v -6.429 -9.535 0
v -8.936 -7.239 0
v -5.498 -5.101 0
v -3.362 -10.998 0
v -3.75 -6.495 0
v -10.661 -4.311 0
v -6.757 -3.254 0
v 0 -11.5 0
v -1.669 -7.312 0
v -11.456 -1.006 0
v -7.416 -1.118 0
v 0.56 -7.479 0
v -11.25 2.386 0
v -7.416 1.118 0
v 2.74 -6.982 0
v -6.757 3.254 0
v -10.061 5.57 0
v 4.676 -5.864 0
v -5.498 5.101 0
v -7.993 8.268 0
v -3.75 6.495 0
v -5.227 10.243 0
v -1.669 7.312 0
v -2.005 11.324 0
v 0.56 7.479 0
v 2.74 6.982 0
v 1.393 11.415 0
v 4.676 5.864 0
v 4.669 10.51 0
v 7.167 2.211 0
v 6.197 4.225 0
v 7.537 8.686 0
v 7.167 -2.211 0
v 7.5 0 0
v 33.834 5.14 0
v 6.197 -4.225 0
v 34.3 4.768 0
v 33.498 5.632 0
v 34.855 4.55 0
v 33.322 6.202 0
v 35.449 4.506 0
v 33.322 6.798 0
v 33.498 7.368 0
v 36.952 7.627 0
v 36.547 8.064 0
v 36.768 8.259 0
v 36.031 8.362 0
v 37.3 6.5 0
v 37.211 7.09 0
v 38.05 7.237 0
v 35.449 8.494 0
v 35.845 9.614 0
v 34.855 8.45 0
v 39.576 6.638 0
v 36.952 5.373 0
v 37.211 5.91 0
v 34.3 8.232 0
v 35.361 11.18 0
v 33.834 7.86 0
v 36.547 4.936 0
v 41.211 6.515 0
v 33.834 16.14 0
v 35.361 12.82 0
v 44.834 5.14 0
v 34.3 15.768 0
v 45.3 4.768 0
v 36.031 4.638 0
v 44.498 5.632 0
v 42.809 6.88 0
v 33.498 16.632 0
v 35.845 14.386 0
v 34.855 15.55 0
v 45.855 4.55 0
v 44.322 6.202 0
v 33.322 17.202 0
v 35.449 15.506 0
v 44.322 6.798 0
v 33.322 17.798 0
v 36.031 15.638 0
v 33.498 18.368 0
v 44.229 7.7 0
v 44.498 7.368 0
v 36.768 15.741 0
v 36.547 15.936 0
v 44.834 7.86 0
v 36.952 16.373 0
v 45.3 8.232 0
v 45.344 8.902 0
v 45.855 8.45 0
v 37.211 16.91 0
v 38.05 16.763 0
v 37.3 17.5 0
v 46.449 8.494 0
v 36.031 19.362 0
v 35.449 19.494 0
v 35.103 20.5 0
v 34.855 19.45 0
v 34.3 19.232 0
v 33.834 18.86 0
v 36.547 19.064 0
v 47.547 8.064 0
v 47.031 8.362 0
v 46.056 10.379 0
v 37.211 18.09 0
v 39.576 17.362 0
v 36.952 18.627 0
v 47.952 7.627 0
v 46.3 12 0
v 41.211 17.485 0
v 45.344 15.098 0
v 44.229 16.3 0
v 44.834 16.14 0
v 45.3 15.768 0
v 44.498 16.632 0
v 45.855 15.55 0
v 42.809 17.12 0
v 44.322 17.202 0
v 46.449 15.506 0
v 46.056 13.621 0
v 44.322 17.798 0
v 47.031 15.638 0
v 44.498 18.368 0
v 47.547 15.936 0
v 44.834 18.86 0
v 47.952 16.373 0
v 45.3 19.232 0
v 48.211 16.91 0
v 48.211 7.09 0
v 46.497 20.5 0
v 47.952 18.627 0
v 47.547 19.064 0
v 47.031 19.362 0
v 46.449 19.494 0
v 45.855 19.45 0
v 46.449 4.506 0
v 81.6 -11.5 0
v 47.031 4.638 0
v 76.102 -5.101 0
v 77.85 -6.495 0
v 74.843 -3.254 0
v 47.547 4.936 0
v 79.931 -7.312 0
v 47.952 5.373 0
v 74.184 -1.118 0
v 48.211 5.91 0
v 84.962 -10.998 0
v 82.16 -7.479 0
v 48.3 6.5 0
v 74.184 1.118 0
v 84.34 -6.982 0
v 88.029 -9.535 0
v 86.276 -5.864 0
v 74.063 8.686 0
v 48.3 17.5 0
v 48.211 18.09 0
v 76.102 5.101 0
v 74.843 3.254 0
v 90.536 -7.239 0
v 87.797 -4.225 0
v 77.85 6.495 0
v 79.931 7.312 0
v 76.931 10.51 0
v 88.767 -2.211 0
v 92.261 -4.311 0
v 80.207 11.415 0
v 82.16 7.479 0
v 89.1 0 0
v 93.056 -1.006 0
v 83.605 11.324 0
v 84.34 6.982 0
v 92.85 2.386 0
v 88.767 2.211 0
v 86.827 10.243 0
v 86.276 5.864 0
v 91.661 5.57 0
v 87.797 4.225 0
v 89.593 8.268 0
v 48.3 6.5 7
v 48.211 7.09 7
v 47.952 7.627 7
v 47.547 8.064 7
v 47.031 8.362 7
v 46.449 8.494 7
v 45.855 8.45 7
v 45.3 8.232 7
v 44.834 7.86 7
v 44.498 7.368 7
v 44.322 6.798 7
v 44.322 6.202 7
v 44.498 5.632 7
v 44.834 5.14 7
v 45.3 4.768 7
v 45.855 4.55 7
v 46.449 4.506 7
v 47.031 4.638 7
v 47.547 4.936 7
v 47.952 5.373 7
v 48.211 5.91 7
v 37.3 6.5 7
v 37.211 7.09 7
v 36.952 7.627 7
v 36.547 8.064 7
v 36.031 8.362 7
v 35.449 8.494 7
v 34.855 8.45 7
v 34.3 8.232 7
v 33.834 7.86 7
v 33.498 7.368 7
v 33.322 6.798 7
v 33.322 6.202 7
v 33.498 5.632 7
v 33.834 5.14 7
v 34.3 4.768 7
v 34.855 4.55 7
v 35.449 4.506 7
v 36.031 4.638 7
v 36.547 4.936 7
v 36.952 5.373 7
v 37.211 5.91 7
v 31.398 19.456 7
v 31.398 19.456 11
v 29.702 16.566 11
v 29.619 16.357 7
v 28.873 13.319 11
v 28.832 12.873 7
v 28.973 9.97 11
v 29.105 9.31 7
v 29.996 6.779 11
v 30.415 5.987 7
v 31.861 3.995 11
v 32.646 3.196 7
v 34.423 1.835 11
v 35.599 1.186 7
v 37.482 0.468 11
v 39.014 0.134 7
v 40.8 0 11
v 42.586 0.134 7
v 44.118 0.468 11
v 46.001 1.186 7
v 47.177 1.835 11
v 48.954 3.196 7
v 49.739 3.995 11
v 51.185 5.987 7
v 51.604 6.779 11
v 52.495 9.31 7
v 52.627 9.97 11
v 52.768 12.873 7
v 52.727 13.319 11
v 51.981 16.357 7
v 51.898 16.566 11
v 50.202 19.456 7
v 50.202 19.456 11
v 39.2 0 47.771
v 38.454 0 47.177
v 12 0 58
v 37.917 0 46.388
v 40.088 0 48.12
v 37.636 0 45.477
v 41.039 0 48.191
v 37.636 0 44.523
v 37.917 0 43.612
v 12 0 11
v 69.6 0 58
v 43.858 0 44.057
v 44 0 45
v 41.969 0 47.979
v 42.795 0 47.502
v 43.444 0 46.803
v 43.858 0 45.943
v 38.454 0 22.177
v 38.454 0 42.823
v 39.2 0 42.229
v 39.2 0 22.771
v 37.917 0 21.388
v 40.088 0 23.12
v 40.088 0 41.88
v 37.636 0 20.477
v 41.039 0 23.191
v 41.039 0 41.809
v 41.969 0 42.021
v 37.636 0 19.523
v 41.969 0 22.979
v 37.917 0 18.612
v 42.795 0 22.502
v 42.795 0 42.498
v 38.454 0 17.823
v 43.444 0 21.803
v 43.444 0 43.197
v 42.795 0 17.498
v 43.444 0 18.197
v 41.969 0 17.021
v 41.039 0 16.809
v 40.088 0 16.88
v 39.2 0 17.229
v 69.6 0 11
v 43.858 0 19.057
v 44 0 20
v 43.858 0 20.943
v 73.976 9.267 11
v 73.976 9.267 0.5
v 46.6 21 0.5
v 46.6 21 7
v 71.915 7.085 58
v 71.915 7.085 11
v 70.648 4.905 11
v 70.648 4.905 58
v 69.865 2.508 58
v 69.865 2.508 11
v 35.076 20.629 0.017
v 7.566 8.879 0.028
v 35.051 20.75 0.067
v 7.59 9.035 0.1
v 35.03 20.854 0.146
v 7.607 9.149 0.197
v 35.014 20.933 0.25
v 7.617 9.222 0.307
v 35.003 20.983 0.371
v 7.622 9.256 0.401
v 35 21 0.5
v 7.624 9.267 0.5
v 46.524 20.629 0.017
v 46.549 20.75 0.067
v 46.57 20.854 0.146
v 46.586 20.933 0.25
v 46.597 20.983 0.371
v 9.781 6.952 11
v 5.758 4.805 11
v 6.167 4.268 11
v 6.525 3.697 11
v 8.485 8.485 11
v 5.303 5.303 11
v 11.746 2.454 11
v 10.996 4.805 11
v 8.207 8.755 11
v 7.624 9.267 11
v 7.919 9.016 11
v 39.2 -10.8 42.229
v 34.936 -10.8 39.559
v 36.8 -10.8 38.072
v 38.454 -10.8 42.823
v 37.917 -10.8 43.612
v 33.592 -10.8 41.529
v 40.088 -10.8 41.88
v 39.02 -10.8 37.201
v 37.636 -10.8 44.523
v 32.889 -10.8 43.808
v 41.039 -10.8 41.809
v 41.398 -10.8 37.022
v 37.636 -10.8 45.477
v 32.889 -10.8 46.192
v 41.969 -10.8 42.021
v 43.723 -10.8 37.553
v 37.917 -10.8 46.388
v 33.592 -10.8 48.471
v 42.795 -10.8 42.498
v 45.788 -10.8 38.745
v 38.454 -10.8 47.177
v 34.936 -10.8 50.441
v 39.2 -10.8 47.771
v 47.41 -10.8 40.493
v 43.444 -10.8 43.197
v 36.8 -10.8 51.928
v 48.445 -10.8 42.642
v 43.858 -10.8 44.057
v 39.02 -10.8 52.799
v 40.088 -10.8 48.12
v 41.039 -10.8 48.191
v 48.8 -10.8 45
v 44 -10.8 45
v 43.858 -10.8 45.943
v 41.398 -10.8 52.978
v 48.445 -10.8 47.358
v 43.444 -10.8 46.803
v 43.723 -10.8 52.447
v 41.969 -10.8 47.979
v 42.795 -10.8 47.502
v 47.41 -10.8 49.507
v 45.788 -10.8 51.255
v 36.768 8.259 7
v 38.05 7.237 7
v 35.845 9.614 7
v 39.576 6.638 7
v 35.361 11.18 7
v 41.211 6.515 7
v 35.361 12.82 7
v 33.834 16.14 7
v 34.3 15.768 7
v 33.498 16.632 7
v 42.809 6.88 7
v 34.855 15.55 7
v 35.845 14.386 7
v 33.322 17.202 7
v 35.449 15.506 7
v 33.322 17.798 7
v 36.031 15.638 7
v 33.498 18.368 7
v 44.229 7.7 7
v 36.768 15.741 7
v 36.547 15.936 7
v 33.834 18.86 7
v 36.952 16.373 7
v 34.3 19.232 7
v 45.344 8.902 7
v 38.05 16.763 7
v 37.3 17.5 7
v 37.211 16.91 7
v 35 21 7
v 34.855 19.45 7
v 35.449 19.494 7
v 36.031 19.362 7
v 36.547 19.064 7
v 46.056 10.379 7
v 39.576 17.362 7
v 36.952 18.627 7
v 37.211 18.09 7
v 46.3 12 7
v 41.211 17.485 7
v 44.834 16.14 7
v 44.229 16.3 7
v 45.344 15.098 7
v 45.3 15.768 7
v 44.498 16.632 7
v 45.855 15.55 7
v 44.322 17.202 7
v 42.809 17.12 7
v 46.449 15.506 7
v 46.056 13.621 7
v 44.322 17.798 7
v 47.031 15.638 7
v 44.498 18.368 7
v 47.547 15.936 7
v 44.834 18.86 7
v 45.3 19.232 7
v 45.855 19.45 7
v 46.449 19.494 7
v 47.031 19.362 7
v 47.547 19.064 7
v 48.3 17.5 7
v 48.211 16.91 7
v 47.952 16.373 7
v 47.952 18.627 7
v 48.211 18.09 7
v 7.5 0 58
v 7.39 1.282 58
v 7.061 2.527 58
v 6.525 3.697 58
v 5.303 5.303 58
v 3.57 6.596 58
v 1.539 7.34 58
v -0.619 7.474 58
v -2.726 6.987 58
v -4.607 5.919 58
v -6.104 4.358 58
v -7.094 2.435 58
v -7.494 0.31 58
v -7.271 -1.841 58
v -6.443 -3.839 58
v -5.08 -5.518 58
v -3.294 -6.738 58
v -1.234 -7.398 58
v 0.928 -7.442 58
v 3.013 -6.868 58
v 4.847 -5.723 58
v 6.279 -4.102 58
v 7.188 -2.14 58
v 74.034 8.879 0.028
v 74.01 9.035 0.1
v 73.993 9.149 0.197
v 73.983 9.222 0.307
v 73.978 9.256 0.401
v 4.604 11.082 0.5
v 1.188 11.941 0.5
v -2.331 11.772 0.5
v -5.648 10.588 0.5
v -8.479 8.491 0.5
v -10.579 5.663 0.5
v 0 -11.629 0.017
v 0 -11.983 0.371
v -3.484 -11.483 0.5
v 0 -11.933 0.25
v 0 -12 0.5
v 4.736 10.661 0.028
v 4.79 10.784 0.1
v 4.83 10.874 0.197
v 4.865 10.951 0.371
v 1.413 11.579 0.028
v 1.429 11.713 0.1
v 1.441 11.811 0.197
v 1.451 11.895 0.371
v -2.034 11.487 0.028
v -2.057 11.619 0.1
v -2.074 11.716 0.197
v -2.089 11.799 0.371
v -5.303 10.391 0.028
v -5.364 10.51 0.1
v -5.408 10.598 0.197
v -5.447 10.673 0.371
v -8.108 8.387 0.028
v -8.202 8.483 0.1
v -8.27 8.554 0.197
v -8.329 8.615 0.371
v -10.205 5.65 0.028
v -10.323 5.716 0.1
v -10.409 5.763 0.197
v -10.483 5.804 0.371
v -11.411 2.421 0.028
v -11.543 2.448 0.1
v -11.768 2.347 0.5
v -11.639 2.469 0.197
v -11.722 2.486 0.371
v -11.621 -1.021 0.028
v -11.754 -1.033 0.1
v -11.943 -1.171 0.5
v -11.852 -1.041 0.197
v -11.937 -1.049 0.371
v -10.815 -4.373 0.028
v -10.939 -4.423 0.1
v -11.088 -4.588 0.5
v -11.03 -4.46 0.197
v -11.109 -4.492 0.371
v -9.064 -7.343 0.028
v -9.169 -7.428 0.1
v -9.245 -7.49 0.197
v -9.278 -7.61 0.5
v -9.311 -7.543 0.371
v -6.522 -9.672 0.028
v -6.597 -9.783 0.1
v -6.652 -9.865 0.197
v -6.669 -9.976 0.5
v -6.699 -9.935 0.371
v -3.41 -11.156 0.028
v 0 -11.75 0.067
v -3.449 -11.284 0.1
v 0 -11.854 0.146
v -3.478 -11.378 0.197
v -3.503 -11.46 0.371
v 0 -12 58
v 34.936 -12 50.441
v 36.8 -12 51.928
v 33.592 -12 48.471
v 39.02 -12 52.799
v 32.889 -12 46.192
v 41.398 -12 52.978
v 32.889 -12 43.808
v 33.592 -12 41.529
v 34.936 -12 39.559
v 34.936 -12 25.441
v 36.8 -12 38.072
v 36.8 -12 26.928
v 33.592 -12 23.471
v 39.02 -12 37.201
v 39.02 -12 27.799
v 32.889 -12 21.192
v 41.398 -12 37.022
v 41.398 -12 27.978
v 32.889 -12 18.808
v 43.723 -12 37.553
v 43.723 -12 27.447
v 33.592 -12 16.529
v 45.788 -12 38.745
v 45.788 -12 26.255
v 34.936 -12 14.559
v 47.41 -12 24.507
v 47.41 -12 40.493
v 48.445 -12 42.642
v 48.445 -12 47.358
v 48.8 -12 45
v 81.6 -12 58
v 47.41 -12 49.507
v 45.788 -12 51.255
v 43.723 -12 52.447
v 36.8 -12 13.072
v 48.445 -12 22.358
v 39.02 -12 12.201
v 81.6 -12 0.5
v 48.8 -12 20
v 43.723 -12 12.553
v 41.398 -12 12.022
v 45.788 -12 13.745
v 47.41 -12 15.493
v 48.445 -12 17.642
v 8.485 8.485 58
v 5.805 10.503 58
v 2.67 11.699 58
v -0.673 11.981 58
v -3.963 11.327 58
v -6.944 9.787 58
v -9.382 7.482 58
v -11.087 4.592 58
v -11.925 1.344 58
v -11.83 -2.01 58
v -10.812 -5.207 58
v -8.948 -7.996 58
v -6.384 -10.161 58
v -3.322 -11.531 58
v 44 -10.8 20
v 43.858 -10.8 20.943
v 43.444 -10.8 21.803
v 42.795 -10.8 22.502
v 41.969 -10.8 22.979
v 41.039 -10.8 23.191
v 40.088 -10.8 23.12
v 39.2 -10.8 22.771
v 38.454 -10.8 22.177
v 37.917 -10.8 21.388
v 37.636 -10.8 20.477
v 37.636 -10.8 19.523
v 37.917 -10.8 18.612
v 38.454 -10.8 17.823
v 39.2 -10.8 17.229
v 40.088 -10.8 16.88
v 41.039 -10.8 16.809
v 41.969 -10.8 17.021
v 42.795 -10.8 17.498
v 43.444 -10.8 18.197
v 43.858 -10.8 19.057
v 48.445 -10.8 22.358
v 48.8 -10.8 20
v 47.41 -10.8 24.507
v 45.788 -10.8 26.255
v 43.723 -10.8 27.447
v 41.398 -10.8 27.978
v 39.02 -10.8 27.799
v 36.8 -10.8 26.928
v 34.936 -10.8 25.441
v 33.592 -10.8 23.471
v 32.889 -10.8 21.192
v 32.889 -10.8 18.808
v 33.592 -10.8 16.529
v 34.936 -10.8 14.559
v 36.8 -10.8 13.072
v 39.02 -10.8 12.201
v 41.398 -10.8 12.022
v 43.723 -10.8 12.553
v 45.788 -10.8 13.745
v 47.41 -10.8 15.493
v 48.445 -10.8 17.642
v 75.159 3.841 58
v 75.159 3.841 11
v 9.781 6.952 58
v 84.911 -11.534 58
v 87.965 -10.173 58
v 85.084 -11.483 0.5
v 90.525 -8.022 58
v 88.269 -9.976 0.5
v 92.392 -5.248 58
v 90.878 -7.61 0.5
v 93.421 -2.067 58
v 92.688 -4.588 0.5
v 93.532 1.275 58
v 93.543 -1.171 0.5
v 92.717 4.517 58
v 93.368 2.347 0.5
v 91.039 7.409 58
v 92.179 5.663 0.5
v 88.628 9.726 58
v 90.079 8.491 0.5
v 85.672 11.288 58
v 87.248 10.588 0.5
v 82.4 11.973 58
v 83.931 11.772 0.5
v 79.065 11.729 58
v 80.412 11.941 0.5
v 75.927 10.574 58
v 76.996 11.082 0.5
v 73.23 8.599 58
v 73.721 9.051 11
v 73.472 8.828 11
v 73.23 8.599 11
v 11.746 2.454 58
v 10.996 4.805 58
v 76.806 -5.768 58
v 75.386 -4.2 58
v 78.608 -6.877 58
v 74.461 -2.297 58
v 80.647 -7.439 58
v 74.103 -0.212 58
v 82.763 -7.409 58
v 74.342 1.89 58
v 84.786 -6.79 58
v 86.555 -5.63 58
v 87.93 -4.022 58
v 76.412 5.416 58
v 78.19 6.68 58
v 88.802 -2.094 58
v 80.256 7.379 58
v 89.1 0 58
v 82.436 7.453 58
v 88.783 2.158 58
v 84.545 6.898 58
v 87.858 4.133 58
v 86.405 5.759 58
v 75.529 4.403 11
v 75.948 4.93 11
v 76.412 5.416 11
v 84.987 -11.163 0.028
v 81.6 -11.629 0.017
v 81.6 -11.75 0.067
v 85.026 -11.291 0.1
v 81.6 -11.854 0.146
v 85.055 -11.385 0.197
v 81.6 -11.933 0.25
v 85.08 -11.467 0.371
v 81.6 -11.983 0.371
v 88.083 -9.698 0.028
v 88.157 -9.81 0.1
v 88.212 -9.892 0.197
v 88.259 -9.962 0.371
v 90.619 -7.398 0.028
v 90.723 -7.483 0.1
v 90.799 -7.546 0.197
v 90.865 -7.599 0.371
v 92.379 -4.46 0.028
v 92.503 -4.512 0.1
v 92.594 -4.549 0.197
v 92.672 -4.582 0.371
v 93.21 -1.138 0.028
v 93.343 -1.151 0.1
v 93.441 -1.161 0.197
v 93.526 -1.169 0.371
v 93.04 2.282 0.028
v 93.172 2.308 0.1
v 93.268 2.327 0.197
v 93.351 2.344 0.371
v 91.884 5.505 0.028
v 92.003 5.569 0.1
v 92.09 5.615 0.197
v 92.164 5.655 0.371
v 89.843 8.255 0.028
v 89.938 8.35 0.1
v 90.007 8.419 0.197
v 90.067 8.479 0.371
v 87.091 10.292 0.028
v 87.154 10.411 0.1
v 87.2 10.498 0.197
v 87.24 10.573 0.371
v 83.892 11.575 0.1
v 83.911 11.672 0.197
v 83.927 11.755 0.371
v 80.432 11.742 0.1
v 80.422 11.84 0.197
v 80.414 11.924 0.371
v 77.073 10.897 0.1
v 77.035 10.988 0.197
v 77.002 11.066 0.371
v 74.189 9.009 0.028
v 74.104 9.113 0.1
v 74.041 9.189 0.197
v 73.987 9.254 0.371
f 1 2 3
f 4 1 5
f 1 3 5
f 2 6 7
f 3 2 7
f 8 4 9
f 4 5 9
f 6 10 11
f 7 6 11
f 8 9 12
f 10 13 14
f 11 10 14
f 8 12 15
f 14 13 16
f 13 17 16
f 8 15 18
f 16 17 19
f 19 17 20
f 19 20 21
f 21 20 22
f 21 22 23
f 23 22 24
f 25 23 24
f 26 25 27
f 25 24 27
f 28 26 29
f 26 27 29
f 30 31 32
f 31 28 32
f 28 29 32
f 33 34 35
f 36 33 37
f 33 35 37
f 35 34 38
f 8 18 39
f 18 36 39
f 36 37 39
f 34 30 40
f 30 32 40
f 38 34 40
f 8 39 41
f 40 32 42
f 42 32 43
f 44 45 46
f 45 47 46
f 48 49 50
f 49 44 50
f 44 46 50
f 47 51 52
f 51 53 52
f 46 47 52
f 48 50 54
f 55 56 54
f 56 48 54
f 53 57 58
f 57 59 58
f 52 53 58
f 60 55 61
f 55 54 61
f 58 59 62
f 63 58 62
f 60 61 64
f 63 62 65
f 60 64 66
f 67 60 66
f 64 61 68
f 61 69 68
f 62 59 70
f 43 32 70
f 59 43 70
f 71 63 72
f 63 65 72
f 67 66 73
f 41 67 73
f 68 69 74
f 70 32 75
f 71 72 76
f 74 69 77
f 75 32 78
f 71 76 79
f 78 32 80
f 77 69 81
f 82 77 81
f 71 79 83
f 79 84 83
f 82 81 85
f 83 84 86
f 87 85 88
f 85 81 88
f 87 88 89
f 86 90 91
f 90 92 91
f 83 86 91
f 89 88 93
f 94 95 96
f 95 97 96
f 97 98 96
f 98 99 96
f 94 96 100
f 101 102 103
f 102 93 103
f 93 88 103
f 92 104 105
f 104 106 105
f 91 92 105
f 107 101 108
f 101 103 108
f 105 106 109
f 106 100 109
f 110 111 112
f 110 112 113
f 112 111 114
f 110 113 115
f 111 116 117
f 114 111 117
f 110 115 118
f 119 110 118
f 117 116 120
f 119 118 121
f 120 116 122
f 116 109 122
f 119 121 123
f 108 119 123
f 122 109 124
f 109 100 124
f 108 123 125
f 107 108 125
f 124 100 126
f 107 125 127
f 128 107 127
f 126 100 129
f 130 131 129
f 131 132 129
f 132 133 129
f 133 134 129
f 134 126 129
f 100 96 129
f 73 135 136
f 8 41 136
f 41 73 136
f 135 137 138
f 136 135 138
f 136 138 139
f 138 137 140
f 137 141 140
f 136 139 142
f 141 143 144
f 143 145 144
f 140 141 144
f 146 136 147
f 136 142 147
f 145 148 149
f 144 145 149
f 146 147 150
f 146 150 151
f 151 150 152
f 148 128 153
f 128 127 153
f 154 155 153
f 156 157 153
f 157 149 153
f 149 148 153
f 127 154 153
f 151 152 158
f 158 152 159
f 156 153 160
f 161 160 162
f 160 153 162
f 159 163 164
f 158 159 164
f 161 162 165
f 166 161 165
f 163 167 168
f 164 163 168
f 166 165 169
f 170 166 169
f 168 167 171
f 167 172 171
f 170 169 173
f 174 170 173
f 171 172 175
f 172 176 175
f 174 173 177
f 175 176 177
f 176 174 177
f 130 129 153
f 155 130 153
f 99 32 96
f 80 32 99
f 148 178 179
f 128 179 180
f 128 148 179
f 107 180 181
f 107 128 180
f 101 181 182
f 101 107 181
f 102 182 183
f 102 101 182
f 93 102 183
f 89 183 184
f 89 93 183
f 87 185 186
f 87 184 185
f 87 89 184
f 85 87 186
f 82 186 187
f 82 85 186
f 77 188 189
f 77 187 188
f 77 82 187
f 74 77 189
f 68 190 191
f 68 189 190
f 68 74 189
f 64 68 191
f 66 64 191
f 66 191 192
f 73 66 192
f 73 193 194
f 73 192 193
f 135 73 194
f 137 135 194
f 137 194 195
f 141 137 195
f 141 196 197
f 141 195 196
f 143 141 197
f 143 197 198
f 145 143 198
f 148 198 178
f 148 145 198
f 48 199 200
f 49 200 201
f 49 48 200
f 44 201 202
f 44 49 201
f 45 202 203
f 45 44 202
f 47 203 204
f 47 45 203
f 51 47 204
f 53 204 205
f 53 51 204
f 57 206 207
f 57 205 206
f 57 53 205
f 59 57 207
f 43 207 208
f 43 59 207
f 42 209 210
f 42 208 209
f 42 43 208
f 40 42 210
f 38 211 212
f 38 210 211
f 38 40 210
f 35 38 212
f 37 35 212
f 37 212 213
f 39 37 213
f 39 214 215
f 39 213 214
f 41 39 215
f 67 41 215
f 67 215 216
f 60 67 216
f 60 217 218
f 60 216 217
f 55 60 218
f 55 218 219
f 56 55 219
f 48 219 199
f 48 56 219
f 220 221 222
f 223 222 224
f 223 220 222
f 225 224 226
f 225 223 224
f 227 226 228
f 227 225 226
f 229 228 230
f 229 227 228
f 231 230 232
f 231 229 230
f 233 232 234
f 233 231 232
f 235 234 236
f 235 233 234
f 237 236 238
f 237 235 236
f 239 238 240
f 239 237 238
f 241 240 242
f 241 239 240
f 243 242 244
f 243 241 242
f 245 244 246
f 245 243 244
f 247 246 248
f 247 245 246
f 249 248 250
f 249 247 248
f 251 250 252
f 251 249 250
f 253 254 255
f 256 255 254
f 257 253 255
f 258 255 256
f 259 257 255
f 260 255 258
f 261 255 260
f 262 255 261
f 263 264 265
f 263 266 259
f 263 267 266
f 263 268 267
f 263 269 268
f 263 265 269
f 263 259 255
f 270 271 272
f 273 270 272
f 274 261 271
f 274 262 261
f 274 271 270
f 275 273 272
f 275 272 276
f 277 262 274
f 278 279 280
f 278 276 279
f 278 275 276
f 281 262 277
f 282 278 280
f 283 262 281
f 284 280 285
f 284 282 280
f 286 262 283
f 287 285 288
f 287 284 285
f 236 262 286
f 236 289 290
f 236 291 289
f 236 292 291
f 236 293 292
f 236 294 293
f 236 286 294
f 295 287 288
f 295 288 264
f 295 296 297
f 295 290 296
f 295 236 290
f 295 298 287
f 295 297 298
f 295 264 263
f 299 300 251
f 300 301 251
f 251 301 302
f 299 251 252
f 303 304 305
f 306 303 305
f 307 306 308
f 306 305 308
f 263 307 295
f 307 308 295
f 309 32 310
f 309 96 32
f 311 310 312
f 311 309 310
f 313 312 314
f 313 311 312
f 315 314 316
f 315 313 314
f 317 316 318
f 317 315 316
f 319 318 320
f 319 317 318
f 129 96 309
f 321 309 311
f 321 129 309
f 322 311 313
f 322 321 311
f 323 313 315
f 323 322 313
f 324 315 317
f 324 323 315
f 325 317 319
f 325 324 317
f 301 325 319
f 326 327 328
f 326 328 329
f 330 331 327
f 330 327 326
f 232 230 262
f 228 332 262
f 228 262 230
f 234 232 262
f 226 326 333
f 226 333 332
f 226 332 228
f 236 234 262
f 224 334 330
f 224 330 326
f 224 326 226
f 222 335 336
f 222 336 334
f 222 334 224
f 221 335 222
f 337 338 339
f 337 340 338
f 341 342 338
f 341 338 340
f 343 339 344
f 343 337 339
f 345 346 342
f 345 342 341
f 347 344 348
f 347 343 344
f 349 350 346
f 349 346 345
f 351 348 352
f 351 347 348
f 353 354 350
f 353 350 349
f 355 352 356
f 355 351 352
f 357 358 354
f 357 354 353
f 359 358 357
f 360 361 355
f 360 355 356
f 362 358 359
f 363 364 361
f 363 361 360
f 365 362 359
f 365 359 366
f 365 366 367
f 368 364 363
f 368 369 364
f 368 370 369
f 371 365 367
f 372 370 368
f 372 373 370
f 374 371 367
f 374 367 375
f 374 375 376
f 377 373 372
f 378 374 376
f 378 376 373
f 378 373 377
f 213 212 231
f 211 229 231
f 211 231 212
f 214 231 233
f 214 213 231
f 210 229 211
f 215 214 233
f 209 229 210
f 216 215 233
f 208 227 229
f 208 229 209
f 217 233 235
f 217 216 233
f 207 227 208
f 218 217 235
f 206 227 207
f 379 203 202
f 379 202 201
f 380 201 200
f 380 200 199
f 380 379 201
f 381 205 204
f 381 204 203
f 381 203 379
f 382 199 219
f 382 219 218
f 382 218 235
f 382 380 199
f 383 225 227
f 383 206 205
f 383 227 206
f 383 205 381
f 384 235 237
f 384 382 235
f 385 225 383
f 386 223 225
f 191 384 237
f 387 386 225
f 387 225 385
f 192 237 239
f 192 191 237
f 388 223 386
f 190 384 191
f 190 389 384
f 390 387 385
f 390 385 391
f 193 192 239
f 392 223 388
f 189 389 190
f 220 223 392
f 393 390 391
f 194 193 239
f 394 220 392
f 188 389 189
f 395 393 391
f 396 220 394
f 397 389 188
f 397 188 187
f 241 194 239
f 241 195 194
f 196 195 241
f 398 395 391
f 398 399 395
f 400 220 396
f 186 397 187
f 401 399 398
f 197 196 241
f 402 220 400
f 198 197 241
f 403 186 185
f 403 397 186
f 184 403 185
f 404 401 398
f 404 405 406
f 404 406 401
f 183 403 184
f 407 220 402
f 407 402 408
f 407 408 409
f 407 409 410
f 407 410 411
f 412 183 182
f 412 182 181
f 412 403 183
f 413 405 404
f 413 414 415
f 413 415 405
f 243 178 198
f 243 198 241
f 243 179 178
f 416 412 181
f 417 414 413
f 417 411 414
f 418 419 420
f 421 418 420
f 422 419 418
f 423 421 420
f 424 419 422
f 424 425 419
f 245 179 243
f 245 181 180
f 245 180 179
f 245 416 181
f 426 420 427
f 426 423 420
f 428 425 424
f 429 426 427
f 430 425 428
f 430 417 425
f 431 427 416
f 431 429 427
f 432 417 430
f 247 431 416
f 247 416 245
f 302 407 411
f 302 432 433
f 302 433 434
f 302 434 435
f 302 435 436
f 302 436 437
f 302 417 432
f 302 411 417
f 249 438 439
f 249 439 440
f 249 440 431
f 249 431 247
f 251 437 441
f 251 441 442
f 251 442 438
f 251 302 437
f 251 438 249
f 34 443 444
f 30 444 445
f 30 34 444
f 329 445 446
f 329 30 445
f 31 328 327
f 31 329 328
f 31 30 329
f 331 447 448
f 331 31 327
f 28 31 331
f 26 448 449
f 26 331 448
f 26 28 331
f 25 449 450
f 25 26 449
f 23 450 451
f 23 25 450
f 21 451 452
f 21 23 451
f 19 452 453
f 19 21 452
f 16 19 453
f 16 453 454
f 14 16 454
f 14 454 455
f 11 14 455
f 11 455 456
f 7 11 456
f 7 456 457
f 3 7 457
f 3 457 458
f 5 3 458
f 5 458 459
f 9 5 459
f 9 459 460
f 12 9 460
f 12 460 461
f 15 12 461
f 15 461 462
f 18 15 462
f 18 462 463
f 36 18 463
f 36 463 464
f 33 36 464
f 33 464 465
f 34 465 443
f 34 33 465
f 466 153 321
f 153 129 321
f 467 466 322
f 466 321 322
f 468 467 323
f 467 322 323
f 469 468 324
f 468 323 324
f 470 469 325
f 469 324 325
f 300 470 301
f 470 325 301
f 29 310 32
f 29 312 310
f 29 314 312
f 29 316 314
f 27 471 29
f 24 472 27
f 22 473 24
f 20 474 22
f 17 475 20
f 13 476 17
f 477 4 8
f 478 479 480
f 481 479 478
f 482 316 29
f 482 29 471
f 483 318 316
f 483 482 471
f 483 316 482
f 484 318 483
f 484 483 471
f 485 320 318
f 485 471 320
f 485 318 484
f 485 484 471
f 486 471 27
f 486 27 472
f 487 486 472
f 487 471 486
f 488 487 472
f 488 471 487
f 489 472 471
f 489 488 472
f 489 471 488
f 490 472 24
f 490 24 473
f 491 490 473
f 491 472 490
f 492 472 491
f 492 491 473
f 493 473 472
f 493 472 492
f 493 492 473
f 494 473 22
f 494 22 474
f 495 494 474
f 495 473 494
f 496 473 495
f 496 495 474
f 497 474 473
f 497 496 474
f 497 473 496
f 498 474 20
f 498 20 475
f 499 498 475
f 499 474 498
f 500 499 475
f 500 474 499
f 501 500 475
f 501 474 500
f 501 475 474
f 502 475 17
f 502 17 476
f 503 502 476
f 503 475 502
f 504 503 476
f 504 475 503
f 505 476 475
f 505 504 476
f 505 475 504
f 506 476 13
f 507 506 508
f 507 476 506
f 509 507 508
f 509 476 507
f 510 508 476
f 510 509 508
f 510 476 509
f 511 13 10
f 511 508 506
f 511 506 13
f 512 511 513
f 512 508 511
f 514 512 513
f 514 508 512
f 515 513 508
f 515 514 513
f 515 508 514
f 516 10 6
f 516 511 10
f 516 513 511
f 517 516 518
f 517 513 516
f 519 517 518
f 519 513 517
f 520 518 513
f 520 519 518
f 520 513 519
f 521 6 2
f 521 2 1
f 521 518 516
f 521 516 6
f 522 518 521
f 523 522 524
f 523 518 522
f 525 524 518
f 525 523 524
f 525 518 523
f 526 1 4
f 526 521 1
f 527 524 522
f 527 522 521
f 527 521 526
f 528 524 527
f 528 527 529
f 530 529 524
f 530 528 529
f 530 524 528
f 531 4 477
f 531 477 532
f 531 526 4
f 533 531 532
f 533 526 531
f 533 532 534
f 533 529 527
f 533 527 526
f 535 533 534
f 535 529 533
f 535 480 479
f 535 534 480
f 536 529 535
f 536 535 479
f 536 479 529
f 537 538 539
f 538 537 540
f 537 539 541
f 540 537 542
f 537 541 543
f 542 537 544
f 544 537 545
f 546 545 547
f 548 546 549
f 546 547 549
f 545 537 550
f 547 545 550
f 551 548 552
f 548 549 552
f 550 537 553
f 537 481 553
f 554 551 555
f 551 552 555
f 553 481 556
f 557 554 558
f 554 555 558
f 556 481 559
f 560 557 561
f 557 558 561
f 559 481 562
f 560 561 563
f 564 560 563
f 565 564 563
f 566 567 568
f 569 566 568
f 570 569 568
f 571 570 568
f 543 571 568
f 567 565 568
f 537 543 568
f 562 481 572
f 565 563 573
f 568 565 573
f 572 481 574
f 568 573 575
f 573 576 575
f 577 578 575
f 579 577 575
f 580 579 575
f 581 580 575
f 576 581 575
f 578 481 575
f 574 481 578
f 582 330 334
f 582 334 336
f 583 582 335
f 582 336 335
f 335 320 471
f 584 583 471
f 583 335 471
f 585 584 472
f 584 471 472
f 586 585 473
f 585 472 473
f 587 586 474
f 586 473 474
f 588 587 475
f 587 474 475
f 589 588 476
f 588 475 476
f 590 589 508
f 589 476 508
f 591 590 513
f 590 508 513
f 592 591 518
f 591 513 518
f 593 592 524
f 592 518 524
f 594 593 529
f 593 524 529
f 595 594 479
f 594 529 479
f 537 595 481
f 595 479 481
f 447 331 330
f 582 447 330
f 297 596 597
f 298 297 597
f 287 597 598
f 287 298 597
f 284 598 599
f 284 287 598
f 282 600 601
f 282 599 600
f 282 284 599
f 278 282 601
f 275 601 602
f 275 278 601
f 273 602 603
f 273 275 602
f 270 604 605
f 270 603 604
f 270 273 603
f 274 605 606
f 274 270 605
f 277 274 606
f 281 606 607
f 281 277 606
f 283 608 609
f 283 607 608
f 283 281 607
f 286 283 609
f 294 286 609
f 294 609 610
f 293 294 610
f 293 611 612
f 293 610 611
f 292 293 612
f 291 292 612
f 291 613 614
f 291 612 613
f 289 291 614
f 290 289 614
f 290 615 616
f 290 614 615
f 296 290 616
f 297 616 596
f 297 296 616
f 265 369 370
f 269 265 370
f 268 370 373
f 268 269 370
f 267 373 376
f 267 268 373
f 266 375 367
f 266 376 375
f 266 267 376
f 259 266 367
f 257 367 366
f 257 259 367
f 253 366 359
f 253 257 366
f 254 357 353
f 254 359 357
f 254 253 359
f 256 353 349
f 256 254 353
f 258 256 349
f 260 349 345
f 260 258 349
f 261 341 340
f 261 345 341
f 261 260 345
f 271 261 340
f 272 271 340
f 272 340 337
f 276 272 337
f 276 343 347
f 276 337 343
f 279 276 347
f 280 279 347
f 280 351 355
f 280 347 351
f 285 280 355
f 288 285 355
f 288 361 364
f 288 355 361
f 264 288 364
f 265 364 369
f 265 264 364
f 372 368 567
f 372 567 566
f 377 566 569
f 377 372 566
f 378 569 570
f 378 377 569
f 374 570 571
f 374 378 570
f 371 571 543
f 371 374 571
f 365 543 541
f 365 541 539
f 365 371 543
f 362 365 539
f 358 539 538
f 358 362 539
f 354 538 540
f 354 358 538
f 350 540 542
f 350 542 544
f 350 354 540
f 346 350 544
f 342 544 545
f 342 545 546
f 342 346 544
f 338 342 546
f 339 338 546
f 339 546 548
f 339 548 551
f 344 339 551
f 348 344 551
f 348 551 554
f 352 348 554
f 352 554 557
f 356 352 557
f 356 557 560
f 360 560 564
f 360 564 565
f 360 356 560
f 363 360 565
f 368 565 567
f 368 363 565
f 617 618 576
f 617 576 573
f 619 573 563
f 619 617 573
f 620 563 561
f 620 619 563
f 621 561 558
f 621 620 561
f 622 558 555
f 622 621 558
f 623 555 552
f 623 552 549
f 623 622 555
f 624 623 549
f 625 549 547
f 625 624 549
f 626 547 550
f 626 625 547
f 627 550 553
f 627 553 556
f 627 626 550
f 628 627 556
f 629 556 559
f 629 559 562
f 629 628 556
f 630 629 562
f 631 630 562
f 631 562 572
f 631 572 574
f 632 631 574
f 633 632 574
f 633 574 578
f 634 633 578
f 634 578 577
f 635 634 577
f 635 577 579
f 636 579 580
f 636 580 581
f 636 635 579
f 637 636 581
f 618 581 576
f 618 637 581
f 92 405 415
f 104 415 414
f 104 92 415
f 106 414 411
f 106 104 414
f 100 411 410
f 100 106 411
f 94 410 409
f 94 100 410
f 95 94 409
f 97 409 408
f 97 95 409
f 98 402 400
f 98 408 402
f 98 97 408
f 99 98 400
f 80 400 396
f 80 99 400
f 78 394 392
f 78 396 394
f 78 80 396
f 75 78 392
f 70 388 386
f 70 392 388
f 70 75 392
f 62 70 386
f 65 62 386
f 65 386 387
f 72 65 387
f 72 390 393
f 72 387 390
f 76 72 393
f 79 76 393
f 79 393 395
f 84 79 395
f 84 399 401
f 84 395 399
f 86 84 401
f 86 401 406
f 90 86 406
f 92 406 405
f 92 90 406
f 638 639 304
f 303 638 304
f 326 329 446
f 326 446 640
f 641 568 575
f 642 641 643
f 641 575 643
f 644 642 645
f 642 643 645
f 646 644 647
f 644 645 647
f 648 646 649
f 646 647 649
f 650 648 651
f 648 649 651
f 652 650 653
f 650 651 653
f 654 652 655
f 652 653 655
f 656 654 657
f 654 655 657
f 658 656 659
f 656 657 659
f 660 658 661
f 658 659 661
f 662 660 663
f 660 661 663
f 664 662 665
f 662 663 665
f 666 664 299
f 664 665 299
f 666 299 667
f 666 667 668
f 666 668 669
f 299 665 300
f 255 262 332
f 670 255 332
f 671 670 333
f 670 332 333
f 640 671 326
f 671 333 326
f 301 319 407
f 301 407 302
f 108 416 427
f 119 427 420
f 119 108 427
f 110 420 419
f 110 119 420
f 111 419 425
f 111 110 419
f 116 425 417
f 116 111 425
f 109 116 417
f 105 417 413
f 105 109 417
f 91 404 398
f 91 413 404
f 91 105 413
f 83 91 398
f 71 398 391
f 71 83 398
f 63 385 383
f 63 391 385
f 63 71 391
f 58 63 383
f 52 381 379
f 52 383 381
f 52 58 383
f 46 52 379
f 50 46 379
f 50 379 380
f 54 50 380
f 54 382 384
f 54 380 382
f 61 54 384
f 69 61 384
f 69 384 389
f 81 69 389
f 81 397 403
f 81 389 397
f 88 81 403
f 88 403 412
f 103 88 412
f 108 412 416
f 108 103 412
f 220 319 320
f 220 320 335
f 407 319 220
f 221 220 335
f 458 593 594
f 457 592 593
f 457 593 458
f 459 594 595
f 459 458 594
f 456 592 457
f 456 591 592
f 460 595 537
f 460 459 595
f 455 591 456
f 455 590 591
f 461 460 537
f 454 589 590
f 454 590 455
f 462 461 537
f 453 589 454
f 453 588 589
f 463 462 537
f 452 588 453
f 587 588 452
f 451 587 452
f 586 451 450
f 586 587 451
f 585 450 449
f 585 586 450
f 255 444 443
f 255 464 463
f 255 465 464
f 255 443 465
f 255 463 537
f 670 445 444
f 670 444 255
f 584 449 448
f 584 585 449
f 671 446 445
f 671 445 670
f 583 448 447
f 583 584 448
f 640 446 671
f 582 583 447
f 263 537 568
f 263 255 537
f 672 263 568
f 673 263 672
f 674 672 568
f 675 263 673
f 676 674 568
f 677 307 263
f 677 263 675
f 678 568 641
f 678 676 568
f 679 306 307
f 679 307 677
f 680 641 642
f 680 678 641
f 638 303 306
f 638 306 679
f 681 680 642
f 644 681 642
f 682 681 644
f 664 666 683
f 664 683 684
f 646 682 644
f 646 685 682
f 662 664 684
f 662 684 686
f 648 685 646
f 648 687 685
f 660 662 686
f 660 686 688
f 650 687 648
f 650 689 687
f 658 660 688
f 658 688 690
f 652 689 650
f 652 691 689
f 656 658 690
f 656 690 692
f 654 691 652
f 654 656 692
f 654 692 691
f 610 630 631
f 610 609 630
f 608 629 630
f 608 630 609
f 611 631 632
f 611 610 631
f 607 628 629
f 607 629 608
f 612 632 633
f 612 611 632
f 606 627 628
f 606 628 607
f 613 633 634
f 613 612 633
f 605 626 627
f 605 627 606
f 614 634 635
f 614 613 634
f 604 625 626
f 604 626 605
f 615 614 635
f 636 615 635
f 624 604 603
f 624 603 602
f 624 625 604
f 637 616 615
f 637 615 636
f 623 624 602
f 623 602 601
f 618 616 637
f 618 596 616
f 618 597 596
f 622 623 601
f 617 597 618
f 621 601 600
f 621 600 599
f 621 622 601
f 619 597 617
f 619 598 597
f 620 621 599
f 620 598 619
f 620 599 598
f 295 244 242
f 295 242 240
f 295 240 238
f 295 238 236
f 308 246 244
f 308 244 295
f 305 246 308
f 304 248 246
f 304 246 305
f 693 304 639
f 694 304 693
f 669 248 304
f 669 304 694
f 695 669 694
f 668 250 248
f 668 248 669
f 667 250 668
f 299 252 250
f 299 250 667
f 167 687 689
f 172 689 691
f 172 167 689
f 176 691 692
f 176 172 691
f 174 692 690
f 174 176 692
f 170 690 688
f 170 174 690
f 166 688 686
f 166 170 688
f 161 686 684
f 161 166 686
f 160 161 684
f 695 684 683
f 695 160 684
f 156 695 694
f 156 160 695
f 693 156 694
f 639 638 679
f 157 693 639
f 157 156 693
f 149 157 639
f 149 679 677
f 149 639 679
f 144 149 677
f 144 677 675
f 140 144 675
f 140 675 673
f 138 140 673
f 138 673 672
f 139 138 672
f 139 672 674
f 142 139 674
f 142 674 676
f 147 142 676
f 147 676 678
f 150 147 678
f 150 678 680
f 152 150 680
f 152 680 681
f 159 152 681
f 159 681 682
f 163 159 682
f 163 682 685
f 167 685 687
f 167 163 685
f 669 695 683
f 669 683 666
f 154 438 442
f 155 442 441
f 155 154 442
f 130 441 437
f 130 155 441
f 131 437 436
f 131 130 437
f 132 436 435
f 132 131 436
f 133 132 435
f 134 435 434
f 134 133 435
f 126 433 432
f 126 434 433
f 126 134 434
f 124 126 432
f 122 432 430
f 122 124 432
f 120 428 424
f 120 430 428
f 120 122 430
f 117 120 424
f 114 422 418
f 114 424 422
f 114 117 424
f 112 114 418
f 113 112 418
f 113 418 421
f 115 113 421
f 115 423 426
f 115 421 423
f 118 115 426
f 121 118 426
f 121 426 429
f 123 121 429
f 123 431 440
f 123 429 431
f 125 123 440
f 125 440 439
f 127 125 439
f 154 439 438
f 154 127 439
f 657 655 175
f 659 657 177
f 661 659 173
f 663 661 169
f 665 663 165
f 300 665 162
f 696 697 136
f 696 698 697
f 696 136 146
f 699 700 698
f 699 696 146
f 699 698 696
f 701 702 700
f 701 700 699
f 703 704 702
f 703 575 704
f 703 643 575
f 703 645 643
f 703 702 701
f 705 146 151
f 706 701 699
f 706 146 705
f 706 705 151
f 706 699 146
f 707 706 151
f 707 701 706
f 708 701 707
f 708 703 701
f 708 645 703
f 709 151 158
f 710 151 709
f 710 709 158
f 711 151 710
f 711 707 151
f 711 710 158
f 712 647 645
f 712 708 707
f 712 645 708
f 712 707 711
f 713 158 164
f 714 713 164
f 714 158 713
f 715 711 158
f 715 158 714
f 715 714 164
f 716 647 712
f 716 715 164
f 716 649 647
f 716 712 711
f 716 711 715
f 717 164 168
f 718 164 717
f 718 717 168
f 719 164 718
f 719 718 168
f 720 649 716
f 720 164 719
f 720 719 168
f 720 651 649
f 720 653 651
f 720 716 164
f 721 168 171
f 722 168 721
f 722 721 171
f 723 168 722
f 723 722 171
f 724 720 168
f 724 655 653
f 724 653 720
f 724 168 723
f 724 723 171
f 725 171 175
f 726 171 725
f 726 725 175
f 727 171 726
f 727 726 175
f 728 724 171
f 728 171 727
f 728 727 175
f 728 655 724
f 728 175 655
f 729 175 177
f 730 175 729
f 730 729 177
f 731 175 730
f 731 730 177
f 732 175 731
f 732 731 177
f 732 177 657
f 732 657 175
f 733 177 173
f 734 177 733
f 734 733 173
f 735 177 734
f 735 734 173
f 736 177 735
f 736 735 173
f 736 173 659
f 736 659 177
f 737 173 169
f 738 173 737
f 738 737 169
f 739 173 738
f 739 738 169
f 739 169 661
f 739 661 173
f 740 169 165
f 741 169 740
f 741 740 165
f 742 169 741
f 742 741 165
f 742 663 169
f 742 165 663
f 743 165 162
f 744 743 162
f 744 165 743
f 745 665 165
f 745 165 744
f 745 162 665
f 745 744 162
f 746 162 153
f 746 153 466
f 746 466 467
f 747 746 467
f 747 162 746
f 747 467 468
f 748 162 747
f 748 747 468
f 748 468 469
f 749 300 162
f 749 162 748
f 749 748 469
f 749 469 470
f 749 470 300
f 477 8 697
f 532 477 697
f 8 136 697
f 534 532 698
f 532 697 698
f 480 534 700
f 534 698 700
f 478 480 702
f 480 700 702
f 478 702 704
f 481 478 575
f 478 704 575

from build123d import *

# Parameters (mm, degrees)
CYLINDER010_R          = 3.2
CYLINDER010_DEPTH      = 40
CYLINDER011_R          = 3.2
CYLINDER011_DEPTH      = 40
CYLINDER012_R          = 8
CYLINDER012_DEPTH      = 1.2
CYLINDER013_R          = 8
CYLINDER013_DEPTH      = 1.2
BOX002_W               = 2
BOX002_H               = 10
BOX002_DEPTH           = 60
BOX002_PLACEMENT_ANGLE = 45
BOX003_W               = 2
BOX003_H               = 10
BOX003_DEPTH           = 60
BOX003_PLACEMENT_ANGLE = 45
CYLINDER006_R          = 2
CYLINDER006_DEPTH      = 20
CYLINDER007_R          = 2
CYLINDER007_DEPTH      = 20
CYLINDER008_R          = 2
CYLINDER008_DEPTH      = 20
CYLINDER009_R          = 2
CYLINDER009_DEPTH      = 20
CYLINDER005_R          = 12
CYLINDER005_DEPTH      = 4
CYLINDER004_R          = 5.5
CYLINDER004_DEPTH      = 20
CYLINDER002_R          = 7.5
CYLINDER002_DEPTH      = 58
CYLINDER_R             = 7.5
CYLINDER_DEPTH         = 58
BOX001_W               = 81.6
BOX001_H               = 33
BOX001_DEPTH           = 11
CHAMFER_1_SIZE2        = 35
CHAMFER_1_SIZE         = 15
CHAMFER_2_SIZE2        = 35
CHAMFER_2_SIZE         = 15
CYLINDER001_R          = 12
CYLINDER001_DEPTH      = 58
CYLINDER003_R          = 12
CYLINDER003_DEPTH      = 58
BOX_W                  = 81.6
BOX_H                  = 12
BOX_DEPTH              = 58
FILLET_R               = 0.5


with BuildPart() as cylinder:
    # Cylinder010 → Cylinder010 (new body)
    with BuildSketch(Plane(origin=(40.8, 20, 20), x_dir=(1, 0, 0), z_dir=(0, -1, 0))):
        Circle(CYLINDER010_R)
    extrude(amount=CYLINDER010_DEPTH)


with BuildPart() as cylinder001:
    # Cylinder011 → Cylinder011 (new body)
    with BuildSketch(Plane(origin=(40.8, 20, 45), x_dir=(1, 0, 0), z_dir=(0, -1, 0))):
        Circle(CYLINDER011_R)
    extrude(amount=CYLINDER011_DEPTH)


with BuildPart() as cylinder002:
    # Cylinder012 → Cylinder012 (new body)
    with BuildSketch(Plane(origin=(40.8, -10.8, 20), x_dir=(1, 0, 0), z_dir=(0, -1, 0))):
        Circle(CYLINDER012_R)
    extrude(amount=CYLINDER012_DEPTH)


with BuildPart() as cylinder003:
    # Cylinder013 → Cylinder013 (new body)
    with BuildSketch(Plane(origin=(40.8, -10.8, 45), x_dir=(1, 0, 0), z_dir=(0, -1, 0))):
        Circle(CYLINDER013_R)
    extrude(amount=CYLINDER013_DEPTH)


with BuildPart() as w_rfel002:
    # Box002 → Box002 (new body)
    with BuildSketch(Plane.XY):
        with Locations((1, 5)):
            Rectangle(BOX002_W, BOX002_H)
    extrude(amount=BOX002_DEPTH)


with BuildPart() as w_rfel002_1:
    # Box002 placement: moved
    add(w_rfel002.part.moved(Location((77, 2, 11))).rotate(Axis((77, 2, 11), (0, 0, 1)), BOX002_PLACEMENT_ANGLE))


with BuildPart() as w_rfel003:
    # Box003 → Box003 (new body)
    with BuildSketch(Plane.XY):
        with Locations((1, 5)):
            Rectangle(BOX003_W, BOX003_H)
    extrude(amount=BOX003_DEPTH)


with BuildPart() as w_rfel003_1:
    # Box003 placement: moved
    add(w_rfel003.part.moved(Location((3, 3, 11))).rotate(Axis((3, 3, 11), (0, 0, -1)), BOX003_PLACEMENT_ANGLE))


with BuildPart() as zylinder006:
    # Cylinder006 → Cylinder006 (new body)
    with BuildSketch(Plane(origin=(35.3, 6.5, 0), x_dir=(1, 0, 0), z_dir=(0, 0, 1))):
        Circle(CYLINDER006_R)
    extrude(amount=CYLINDER006_DEPTH)


with BuildPart() as zylinder007:
    # Cylinder007 → Cylinder007 (new body)
    with BuildSketch(Plane(origin=(35.3, 17.5, 0), x_dir=(1, 0, 0), z_dir=(0, 0, 1))):
        Circle(CYLINDER007_R)
    extrude(amount=CYLINDER007_DEPTH)


with BuildPart() as zylinder008:
    # Cylinder008 → Cylinder008 (new body)
    with BuildSketch(Plane(origin=(46.3, 6.5, 0), x_dir=(1, 0, 0), z_dir=(0, 0, 1))):
        Circle(CYLINDER008_R)
    extrude(amount=CYLINDER008_DEPTH)


with BuildPart() as zylinder009:
    # Cylinder009 → Cylinder009 (new body)
    with BuildSketch(Plane(origin=(46.3, 17.5, 0), x_dir=(1, 0, 0), z_dir=(0, 0, 1))):
        Circle(CYLINDER009_R)
    extrude(amount=CYLINDER009_DEPTH)


with BuildPart() as zylinder005:
    # Cylinder005 → Cylinder005 (new body)
    with BuildSketch(Plane(origin=(40.8, 12, 7), x_dir=(1, 0, 0), z_dir=(0, 0, 1))):
        Circle(CYLINDER005_R)
    extrude(amount=CYLINDER005_DEPTH)


with BuildPart() as zylinder004:
    # Cylinder004 → Cylinder004 (new body)
    with BuildSketch(Plane(origin=(40.8, 12, 0), x_dir=(1, 0, 0), z_dir=(0, 0, 1))):
        Circle(CYLINDER004_R)
    extrude(amount=CYLINDER004_DEPTH)


with BuildPart() as zylinder002:
    # Cylinder002 → Cylinder002 (new body)
    with BuildSketch(Plane(origin=(81.6, 0, 0), x_dir=(1, 0, 0), z_dir=(0, 0, 1))):
        Circle(CYLINDER002_R)
    extrude(amount=CYLINDER002_DEPTH)


with BuildPart() as zylinder:
    # Cylinder → Cylinder (new body)
    with BuildSketch(Plane.XY):
        Circle(CYLINDER_R)
    extrude(amount=CYLINDER_DEPTH)


with BuildPart() as chamfer_body:
    # Box001 → Box001 (new body)
    with BuildSketch(Plane(origin=(0, -12, 0), x_dir=(1, 0, 0), z_dir=(0, 0, 1))):
        with Locations((40.8, 16.5)):
            Rectangle(BOX001_W, BOX001_H)
    extrude(amount=BOX001_DEPTH)

    # Chamfer 1
    chamfer_1_edges = [chamfer_body.edges().sort_by_distance(p)[0] for p in [
        (81.6, 21, 5.5),
    ]]
    chamfer_1_side = chamfer_body.faces().sort_by_distance((81.6, 4.5, 5.5))[0]
    chamfer(chamfer_1_edges, length=CHAMFER_1_SIZE, length2=CHAMFER_1_SIZE2, reference=chamfer_1_side)

    # Chamfer 2
    chamfer_2_edges = [chamfer_body.edges().sort_by_distance(p)[0] for p in [
        (0, 21, 5.5),
    ]]
    chamfer_2_side = chamfer_body.faces().sort_by_distance((0, 4.5, 5.5))[0]
    chamfer(chamfer_2_edges, length=CHAMFER_2_SIZE, length2=CHAMFER_2_SIZE2, reference=chamfer_2_side)


with BuildPart() as zylinder001:
    # Cylinder001 → Cylinder001 (new body)
    with BuildSketch(Plane.XY):
        Circle(CYLINDER001_R)
    extrude(amount=CYLINDER001_DEPTH)


with BuildPart() as zylinder003:
    # Cylinder003 → Cylinder003 (new body)
    with BuildSketch(Plane(origin=(81.6, 0, 0), x_dir=(1, 0, 0), z_dir=(0, 0, 1))):
        Circle(CYLINDER003_R)
    extrude(amount=CYLINDER003_DEPTH)


with BuildPart() as fillet_body:
    # Box → Box (new body)
    with BuildSketch(Plane(origin=(0, -12, 0), x_dir=(1, 0, 0), z_dir=(0, 0, 1))):
        with Locations((40.8, 6)):
            Rectangle(BOX_W, BOX_H)
    extrude(amount=BOX_DEPTH)

    # Fusion: union Chamfer body, Zylinder001, Zylinder003
    add(chamfer_body.part)
    add(zylinder001.part)
    add(zylinder003.part)

    # Cut: cut Zylinder
    add(zylinder.part, mode=Mode.SUBTRACT)

    # Cut001: cut Zylinder002
    add(zylinder002.part, mode=Mode.SUBTRACT)

    # Cut002: cut Zylinder004
    add(zylinder004.part, mode=Mode.SUBTRACT)

    # Cut003: cut Zylinder005
    add(zylinder005.part, mode=Mode.SUBTRACT)

    # Cut004: cut Zylinder009
    add(zylinder009.part, mode=Mode.SUBTRACT)

    # Cut005: cut Zylinder008
    add(zylinder008.part, mode=Mode.SUBTRACT)

    # Cut006: cut Zylinder007
    add(zylinder007.part, mode=Mode.SUBTRACT)

    # Cut007: cut Zylinder006
    add(zylinder006.part, mode=Mode.SUBTRACT)

    # Cut008: cut Würfel003
    add(w_rfel003_1.part, mode=Mode.SUBTRACT)

    # Cut009: cut Würfel002
    add(w_rfel002_1.part, mode=Mode.SUBTRACT)

    # Cut010: cut Cylinder003
    add(cylinder003.part, mode=Mode.SUBTRACT)

    # Cut011: cut Cylinder002
    add(cylinder002.part, mode=Mode.SUBTRACT)

    # Cut012: cut Cylinder001
    add(cylinder001.part, mode=Mode.SUBTRACT)

    # Cut013: cut Cylinder
    add(cylinder.part, mode=Mode.SUBTRACT)

    # Fillet
    fillet_edges = [fillet_body.edges().sort_by_distance(p)[0] for p in [
        (-11.296167, 4.049272, 0),
        (40.8, -12, 0),
        (21.311771, 15.133616, 0),
        (40.8, 21, 0),
        (60.288229, 15.133616, 0),
        (86.724329, 10.850864, 0),
        (90.085281, -8.485281, 0),
    ]]
    fillet(fillet_edges, radius=FILLET_R)


solid = fillet_body.part
